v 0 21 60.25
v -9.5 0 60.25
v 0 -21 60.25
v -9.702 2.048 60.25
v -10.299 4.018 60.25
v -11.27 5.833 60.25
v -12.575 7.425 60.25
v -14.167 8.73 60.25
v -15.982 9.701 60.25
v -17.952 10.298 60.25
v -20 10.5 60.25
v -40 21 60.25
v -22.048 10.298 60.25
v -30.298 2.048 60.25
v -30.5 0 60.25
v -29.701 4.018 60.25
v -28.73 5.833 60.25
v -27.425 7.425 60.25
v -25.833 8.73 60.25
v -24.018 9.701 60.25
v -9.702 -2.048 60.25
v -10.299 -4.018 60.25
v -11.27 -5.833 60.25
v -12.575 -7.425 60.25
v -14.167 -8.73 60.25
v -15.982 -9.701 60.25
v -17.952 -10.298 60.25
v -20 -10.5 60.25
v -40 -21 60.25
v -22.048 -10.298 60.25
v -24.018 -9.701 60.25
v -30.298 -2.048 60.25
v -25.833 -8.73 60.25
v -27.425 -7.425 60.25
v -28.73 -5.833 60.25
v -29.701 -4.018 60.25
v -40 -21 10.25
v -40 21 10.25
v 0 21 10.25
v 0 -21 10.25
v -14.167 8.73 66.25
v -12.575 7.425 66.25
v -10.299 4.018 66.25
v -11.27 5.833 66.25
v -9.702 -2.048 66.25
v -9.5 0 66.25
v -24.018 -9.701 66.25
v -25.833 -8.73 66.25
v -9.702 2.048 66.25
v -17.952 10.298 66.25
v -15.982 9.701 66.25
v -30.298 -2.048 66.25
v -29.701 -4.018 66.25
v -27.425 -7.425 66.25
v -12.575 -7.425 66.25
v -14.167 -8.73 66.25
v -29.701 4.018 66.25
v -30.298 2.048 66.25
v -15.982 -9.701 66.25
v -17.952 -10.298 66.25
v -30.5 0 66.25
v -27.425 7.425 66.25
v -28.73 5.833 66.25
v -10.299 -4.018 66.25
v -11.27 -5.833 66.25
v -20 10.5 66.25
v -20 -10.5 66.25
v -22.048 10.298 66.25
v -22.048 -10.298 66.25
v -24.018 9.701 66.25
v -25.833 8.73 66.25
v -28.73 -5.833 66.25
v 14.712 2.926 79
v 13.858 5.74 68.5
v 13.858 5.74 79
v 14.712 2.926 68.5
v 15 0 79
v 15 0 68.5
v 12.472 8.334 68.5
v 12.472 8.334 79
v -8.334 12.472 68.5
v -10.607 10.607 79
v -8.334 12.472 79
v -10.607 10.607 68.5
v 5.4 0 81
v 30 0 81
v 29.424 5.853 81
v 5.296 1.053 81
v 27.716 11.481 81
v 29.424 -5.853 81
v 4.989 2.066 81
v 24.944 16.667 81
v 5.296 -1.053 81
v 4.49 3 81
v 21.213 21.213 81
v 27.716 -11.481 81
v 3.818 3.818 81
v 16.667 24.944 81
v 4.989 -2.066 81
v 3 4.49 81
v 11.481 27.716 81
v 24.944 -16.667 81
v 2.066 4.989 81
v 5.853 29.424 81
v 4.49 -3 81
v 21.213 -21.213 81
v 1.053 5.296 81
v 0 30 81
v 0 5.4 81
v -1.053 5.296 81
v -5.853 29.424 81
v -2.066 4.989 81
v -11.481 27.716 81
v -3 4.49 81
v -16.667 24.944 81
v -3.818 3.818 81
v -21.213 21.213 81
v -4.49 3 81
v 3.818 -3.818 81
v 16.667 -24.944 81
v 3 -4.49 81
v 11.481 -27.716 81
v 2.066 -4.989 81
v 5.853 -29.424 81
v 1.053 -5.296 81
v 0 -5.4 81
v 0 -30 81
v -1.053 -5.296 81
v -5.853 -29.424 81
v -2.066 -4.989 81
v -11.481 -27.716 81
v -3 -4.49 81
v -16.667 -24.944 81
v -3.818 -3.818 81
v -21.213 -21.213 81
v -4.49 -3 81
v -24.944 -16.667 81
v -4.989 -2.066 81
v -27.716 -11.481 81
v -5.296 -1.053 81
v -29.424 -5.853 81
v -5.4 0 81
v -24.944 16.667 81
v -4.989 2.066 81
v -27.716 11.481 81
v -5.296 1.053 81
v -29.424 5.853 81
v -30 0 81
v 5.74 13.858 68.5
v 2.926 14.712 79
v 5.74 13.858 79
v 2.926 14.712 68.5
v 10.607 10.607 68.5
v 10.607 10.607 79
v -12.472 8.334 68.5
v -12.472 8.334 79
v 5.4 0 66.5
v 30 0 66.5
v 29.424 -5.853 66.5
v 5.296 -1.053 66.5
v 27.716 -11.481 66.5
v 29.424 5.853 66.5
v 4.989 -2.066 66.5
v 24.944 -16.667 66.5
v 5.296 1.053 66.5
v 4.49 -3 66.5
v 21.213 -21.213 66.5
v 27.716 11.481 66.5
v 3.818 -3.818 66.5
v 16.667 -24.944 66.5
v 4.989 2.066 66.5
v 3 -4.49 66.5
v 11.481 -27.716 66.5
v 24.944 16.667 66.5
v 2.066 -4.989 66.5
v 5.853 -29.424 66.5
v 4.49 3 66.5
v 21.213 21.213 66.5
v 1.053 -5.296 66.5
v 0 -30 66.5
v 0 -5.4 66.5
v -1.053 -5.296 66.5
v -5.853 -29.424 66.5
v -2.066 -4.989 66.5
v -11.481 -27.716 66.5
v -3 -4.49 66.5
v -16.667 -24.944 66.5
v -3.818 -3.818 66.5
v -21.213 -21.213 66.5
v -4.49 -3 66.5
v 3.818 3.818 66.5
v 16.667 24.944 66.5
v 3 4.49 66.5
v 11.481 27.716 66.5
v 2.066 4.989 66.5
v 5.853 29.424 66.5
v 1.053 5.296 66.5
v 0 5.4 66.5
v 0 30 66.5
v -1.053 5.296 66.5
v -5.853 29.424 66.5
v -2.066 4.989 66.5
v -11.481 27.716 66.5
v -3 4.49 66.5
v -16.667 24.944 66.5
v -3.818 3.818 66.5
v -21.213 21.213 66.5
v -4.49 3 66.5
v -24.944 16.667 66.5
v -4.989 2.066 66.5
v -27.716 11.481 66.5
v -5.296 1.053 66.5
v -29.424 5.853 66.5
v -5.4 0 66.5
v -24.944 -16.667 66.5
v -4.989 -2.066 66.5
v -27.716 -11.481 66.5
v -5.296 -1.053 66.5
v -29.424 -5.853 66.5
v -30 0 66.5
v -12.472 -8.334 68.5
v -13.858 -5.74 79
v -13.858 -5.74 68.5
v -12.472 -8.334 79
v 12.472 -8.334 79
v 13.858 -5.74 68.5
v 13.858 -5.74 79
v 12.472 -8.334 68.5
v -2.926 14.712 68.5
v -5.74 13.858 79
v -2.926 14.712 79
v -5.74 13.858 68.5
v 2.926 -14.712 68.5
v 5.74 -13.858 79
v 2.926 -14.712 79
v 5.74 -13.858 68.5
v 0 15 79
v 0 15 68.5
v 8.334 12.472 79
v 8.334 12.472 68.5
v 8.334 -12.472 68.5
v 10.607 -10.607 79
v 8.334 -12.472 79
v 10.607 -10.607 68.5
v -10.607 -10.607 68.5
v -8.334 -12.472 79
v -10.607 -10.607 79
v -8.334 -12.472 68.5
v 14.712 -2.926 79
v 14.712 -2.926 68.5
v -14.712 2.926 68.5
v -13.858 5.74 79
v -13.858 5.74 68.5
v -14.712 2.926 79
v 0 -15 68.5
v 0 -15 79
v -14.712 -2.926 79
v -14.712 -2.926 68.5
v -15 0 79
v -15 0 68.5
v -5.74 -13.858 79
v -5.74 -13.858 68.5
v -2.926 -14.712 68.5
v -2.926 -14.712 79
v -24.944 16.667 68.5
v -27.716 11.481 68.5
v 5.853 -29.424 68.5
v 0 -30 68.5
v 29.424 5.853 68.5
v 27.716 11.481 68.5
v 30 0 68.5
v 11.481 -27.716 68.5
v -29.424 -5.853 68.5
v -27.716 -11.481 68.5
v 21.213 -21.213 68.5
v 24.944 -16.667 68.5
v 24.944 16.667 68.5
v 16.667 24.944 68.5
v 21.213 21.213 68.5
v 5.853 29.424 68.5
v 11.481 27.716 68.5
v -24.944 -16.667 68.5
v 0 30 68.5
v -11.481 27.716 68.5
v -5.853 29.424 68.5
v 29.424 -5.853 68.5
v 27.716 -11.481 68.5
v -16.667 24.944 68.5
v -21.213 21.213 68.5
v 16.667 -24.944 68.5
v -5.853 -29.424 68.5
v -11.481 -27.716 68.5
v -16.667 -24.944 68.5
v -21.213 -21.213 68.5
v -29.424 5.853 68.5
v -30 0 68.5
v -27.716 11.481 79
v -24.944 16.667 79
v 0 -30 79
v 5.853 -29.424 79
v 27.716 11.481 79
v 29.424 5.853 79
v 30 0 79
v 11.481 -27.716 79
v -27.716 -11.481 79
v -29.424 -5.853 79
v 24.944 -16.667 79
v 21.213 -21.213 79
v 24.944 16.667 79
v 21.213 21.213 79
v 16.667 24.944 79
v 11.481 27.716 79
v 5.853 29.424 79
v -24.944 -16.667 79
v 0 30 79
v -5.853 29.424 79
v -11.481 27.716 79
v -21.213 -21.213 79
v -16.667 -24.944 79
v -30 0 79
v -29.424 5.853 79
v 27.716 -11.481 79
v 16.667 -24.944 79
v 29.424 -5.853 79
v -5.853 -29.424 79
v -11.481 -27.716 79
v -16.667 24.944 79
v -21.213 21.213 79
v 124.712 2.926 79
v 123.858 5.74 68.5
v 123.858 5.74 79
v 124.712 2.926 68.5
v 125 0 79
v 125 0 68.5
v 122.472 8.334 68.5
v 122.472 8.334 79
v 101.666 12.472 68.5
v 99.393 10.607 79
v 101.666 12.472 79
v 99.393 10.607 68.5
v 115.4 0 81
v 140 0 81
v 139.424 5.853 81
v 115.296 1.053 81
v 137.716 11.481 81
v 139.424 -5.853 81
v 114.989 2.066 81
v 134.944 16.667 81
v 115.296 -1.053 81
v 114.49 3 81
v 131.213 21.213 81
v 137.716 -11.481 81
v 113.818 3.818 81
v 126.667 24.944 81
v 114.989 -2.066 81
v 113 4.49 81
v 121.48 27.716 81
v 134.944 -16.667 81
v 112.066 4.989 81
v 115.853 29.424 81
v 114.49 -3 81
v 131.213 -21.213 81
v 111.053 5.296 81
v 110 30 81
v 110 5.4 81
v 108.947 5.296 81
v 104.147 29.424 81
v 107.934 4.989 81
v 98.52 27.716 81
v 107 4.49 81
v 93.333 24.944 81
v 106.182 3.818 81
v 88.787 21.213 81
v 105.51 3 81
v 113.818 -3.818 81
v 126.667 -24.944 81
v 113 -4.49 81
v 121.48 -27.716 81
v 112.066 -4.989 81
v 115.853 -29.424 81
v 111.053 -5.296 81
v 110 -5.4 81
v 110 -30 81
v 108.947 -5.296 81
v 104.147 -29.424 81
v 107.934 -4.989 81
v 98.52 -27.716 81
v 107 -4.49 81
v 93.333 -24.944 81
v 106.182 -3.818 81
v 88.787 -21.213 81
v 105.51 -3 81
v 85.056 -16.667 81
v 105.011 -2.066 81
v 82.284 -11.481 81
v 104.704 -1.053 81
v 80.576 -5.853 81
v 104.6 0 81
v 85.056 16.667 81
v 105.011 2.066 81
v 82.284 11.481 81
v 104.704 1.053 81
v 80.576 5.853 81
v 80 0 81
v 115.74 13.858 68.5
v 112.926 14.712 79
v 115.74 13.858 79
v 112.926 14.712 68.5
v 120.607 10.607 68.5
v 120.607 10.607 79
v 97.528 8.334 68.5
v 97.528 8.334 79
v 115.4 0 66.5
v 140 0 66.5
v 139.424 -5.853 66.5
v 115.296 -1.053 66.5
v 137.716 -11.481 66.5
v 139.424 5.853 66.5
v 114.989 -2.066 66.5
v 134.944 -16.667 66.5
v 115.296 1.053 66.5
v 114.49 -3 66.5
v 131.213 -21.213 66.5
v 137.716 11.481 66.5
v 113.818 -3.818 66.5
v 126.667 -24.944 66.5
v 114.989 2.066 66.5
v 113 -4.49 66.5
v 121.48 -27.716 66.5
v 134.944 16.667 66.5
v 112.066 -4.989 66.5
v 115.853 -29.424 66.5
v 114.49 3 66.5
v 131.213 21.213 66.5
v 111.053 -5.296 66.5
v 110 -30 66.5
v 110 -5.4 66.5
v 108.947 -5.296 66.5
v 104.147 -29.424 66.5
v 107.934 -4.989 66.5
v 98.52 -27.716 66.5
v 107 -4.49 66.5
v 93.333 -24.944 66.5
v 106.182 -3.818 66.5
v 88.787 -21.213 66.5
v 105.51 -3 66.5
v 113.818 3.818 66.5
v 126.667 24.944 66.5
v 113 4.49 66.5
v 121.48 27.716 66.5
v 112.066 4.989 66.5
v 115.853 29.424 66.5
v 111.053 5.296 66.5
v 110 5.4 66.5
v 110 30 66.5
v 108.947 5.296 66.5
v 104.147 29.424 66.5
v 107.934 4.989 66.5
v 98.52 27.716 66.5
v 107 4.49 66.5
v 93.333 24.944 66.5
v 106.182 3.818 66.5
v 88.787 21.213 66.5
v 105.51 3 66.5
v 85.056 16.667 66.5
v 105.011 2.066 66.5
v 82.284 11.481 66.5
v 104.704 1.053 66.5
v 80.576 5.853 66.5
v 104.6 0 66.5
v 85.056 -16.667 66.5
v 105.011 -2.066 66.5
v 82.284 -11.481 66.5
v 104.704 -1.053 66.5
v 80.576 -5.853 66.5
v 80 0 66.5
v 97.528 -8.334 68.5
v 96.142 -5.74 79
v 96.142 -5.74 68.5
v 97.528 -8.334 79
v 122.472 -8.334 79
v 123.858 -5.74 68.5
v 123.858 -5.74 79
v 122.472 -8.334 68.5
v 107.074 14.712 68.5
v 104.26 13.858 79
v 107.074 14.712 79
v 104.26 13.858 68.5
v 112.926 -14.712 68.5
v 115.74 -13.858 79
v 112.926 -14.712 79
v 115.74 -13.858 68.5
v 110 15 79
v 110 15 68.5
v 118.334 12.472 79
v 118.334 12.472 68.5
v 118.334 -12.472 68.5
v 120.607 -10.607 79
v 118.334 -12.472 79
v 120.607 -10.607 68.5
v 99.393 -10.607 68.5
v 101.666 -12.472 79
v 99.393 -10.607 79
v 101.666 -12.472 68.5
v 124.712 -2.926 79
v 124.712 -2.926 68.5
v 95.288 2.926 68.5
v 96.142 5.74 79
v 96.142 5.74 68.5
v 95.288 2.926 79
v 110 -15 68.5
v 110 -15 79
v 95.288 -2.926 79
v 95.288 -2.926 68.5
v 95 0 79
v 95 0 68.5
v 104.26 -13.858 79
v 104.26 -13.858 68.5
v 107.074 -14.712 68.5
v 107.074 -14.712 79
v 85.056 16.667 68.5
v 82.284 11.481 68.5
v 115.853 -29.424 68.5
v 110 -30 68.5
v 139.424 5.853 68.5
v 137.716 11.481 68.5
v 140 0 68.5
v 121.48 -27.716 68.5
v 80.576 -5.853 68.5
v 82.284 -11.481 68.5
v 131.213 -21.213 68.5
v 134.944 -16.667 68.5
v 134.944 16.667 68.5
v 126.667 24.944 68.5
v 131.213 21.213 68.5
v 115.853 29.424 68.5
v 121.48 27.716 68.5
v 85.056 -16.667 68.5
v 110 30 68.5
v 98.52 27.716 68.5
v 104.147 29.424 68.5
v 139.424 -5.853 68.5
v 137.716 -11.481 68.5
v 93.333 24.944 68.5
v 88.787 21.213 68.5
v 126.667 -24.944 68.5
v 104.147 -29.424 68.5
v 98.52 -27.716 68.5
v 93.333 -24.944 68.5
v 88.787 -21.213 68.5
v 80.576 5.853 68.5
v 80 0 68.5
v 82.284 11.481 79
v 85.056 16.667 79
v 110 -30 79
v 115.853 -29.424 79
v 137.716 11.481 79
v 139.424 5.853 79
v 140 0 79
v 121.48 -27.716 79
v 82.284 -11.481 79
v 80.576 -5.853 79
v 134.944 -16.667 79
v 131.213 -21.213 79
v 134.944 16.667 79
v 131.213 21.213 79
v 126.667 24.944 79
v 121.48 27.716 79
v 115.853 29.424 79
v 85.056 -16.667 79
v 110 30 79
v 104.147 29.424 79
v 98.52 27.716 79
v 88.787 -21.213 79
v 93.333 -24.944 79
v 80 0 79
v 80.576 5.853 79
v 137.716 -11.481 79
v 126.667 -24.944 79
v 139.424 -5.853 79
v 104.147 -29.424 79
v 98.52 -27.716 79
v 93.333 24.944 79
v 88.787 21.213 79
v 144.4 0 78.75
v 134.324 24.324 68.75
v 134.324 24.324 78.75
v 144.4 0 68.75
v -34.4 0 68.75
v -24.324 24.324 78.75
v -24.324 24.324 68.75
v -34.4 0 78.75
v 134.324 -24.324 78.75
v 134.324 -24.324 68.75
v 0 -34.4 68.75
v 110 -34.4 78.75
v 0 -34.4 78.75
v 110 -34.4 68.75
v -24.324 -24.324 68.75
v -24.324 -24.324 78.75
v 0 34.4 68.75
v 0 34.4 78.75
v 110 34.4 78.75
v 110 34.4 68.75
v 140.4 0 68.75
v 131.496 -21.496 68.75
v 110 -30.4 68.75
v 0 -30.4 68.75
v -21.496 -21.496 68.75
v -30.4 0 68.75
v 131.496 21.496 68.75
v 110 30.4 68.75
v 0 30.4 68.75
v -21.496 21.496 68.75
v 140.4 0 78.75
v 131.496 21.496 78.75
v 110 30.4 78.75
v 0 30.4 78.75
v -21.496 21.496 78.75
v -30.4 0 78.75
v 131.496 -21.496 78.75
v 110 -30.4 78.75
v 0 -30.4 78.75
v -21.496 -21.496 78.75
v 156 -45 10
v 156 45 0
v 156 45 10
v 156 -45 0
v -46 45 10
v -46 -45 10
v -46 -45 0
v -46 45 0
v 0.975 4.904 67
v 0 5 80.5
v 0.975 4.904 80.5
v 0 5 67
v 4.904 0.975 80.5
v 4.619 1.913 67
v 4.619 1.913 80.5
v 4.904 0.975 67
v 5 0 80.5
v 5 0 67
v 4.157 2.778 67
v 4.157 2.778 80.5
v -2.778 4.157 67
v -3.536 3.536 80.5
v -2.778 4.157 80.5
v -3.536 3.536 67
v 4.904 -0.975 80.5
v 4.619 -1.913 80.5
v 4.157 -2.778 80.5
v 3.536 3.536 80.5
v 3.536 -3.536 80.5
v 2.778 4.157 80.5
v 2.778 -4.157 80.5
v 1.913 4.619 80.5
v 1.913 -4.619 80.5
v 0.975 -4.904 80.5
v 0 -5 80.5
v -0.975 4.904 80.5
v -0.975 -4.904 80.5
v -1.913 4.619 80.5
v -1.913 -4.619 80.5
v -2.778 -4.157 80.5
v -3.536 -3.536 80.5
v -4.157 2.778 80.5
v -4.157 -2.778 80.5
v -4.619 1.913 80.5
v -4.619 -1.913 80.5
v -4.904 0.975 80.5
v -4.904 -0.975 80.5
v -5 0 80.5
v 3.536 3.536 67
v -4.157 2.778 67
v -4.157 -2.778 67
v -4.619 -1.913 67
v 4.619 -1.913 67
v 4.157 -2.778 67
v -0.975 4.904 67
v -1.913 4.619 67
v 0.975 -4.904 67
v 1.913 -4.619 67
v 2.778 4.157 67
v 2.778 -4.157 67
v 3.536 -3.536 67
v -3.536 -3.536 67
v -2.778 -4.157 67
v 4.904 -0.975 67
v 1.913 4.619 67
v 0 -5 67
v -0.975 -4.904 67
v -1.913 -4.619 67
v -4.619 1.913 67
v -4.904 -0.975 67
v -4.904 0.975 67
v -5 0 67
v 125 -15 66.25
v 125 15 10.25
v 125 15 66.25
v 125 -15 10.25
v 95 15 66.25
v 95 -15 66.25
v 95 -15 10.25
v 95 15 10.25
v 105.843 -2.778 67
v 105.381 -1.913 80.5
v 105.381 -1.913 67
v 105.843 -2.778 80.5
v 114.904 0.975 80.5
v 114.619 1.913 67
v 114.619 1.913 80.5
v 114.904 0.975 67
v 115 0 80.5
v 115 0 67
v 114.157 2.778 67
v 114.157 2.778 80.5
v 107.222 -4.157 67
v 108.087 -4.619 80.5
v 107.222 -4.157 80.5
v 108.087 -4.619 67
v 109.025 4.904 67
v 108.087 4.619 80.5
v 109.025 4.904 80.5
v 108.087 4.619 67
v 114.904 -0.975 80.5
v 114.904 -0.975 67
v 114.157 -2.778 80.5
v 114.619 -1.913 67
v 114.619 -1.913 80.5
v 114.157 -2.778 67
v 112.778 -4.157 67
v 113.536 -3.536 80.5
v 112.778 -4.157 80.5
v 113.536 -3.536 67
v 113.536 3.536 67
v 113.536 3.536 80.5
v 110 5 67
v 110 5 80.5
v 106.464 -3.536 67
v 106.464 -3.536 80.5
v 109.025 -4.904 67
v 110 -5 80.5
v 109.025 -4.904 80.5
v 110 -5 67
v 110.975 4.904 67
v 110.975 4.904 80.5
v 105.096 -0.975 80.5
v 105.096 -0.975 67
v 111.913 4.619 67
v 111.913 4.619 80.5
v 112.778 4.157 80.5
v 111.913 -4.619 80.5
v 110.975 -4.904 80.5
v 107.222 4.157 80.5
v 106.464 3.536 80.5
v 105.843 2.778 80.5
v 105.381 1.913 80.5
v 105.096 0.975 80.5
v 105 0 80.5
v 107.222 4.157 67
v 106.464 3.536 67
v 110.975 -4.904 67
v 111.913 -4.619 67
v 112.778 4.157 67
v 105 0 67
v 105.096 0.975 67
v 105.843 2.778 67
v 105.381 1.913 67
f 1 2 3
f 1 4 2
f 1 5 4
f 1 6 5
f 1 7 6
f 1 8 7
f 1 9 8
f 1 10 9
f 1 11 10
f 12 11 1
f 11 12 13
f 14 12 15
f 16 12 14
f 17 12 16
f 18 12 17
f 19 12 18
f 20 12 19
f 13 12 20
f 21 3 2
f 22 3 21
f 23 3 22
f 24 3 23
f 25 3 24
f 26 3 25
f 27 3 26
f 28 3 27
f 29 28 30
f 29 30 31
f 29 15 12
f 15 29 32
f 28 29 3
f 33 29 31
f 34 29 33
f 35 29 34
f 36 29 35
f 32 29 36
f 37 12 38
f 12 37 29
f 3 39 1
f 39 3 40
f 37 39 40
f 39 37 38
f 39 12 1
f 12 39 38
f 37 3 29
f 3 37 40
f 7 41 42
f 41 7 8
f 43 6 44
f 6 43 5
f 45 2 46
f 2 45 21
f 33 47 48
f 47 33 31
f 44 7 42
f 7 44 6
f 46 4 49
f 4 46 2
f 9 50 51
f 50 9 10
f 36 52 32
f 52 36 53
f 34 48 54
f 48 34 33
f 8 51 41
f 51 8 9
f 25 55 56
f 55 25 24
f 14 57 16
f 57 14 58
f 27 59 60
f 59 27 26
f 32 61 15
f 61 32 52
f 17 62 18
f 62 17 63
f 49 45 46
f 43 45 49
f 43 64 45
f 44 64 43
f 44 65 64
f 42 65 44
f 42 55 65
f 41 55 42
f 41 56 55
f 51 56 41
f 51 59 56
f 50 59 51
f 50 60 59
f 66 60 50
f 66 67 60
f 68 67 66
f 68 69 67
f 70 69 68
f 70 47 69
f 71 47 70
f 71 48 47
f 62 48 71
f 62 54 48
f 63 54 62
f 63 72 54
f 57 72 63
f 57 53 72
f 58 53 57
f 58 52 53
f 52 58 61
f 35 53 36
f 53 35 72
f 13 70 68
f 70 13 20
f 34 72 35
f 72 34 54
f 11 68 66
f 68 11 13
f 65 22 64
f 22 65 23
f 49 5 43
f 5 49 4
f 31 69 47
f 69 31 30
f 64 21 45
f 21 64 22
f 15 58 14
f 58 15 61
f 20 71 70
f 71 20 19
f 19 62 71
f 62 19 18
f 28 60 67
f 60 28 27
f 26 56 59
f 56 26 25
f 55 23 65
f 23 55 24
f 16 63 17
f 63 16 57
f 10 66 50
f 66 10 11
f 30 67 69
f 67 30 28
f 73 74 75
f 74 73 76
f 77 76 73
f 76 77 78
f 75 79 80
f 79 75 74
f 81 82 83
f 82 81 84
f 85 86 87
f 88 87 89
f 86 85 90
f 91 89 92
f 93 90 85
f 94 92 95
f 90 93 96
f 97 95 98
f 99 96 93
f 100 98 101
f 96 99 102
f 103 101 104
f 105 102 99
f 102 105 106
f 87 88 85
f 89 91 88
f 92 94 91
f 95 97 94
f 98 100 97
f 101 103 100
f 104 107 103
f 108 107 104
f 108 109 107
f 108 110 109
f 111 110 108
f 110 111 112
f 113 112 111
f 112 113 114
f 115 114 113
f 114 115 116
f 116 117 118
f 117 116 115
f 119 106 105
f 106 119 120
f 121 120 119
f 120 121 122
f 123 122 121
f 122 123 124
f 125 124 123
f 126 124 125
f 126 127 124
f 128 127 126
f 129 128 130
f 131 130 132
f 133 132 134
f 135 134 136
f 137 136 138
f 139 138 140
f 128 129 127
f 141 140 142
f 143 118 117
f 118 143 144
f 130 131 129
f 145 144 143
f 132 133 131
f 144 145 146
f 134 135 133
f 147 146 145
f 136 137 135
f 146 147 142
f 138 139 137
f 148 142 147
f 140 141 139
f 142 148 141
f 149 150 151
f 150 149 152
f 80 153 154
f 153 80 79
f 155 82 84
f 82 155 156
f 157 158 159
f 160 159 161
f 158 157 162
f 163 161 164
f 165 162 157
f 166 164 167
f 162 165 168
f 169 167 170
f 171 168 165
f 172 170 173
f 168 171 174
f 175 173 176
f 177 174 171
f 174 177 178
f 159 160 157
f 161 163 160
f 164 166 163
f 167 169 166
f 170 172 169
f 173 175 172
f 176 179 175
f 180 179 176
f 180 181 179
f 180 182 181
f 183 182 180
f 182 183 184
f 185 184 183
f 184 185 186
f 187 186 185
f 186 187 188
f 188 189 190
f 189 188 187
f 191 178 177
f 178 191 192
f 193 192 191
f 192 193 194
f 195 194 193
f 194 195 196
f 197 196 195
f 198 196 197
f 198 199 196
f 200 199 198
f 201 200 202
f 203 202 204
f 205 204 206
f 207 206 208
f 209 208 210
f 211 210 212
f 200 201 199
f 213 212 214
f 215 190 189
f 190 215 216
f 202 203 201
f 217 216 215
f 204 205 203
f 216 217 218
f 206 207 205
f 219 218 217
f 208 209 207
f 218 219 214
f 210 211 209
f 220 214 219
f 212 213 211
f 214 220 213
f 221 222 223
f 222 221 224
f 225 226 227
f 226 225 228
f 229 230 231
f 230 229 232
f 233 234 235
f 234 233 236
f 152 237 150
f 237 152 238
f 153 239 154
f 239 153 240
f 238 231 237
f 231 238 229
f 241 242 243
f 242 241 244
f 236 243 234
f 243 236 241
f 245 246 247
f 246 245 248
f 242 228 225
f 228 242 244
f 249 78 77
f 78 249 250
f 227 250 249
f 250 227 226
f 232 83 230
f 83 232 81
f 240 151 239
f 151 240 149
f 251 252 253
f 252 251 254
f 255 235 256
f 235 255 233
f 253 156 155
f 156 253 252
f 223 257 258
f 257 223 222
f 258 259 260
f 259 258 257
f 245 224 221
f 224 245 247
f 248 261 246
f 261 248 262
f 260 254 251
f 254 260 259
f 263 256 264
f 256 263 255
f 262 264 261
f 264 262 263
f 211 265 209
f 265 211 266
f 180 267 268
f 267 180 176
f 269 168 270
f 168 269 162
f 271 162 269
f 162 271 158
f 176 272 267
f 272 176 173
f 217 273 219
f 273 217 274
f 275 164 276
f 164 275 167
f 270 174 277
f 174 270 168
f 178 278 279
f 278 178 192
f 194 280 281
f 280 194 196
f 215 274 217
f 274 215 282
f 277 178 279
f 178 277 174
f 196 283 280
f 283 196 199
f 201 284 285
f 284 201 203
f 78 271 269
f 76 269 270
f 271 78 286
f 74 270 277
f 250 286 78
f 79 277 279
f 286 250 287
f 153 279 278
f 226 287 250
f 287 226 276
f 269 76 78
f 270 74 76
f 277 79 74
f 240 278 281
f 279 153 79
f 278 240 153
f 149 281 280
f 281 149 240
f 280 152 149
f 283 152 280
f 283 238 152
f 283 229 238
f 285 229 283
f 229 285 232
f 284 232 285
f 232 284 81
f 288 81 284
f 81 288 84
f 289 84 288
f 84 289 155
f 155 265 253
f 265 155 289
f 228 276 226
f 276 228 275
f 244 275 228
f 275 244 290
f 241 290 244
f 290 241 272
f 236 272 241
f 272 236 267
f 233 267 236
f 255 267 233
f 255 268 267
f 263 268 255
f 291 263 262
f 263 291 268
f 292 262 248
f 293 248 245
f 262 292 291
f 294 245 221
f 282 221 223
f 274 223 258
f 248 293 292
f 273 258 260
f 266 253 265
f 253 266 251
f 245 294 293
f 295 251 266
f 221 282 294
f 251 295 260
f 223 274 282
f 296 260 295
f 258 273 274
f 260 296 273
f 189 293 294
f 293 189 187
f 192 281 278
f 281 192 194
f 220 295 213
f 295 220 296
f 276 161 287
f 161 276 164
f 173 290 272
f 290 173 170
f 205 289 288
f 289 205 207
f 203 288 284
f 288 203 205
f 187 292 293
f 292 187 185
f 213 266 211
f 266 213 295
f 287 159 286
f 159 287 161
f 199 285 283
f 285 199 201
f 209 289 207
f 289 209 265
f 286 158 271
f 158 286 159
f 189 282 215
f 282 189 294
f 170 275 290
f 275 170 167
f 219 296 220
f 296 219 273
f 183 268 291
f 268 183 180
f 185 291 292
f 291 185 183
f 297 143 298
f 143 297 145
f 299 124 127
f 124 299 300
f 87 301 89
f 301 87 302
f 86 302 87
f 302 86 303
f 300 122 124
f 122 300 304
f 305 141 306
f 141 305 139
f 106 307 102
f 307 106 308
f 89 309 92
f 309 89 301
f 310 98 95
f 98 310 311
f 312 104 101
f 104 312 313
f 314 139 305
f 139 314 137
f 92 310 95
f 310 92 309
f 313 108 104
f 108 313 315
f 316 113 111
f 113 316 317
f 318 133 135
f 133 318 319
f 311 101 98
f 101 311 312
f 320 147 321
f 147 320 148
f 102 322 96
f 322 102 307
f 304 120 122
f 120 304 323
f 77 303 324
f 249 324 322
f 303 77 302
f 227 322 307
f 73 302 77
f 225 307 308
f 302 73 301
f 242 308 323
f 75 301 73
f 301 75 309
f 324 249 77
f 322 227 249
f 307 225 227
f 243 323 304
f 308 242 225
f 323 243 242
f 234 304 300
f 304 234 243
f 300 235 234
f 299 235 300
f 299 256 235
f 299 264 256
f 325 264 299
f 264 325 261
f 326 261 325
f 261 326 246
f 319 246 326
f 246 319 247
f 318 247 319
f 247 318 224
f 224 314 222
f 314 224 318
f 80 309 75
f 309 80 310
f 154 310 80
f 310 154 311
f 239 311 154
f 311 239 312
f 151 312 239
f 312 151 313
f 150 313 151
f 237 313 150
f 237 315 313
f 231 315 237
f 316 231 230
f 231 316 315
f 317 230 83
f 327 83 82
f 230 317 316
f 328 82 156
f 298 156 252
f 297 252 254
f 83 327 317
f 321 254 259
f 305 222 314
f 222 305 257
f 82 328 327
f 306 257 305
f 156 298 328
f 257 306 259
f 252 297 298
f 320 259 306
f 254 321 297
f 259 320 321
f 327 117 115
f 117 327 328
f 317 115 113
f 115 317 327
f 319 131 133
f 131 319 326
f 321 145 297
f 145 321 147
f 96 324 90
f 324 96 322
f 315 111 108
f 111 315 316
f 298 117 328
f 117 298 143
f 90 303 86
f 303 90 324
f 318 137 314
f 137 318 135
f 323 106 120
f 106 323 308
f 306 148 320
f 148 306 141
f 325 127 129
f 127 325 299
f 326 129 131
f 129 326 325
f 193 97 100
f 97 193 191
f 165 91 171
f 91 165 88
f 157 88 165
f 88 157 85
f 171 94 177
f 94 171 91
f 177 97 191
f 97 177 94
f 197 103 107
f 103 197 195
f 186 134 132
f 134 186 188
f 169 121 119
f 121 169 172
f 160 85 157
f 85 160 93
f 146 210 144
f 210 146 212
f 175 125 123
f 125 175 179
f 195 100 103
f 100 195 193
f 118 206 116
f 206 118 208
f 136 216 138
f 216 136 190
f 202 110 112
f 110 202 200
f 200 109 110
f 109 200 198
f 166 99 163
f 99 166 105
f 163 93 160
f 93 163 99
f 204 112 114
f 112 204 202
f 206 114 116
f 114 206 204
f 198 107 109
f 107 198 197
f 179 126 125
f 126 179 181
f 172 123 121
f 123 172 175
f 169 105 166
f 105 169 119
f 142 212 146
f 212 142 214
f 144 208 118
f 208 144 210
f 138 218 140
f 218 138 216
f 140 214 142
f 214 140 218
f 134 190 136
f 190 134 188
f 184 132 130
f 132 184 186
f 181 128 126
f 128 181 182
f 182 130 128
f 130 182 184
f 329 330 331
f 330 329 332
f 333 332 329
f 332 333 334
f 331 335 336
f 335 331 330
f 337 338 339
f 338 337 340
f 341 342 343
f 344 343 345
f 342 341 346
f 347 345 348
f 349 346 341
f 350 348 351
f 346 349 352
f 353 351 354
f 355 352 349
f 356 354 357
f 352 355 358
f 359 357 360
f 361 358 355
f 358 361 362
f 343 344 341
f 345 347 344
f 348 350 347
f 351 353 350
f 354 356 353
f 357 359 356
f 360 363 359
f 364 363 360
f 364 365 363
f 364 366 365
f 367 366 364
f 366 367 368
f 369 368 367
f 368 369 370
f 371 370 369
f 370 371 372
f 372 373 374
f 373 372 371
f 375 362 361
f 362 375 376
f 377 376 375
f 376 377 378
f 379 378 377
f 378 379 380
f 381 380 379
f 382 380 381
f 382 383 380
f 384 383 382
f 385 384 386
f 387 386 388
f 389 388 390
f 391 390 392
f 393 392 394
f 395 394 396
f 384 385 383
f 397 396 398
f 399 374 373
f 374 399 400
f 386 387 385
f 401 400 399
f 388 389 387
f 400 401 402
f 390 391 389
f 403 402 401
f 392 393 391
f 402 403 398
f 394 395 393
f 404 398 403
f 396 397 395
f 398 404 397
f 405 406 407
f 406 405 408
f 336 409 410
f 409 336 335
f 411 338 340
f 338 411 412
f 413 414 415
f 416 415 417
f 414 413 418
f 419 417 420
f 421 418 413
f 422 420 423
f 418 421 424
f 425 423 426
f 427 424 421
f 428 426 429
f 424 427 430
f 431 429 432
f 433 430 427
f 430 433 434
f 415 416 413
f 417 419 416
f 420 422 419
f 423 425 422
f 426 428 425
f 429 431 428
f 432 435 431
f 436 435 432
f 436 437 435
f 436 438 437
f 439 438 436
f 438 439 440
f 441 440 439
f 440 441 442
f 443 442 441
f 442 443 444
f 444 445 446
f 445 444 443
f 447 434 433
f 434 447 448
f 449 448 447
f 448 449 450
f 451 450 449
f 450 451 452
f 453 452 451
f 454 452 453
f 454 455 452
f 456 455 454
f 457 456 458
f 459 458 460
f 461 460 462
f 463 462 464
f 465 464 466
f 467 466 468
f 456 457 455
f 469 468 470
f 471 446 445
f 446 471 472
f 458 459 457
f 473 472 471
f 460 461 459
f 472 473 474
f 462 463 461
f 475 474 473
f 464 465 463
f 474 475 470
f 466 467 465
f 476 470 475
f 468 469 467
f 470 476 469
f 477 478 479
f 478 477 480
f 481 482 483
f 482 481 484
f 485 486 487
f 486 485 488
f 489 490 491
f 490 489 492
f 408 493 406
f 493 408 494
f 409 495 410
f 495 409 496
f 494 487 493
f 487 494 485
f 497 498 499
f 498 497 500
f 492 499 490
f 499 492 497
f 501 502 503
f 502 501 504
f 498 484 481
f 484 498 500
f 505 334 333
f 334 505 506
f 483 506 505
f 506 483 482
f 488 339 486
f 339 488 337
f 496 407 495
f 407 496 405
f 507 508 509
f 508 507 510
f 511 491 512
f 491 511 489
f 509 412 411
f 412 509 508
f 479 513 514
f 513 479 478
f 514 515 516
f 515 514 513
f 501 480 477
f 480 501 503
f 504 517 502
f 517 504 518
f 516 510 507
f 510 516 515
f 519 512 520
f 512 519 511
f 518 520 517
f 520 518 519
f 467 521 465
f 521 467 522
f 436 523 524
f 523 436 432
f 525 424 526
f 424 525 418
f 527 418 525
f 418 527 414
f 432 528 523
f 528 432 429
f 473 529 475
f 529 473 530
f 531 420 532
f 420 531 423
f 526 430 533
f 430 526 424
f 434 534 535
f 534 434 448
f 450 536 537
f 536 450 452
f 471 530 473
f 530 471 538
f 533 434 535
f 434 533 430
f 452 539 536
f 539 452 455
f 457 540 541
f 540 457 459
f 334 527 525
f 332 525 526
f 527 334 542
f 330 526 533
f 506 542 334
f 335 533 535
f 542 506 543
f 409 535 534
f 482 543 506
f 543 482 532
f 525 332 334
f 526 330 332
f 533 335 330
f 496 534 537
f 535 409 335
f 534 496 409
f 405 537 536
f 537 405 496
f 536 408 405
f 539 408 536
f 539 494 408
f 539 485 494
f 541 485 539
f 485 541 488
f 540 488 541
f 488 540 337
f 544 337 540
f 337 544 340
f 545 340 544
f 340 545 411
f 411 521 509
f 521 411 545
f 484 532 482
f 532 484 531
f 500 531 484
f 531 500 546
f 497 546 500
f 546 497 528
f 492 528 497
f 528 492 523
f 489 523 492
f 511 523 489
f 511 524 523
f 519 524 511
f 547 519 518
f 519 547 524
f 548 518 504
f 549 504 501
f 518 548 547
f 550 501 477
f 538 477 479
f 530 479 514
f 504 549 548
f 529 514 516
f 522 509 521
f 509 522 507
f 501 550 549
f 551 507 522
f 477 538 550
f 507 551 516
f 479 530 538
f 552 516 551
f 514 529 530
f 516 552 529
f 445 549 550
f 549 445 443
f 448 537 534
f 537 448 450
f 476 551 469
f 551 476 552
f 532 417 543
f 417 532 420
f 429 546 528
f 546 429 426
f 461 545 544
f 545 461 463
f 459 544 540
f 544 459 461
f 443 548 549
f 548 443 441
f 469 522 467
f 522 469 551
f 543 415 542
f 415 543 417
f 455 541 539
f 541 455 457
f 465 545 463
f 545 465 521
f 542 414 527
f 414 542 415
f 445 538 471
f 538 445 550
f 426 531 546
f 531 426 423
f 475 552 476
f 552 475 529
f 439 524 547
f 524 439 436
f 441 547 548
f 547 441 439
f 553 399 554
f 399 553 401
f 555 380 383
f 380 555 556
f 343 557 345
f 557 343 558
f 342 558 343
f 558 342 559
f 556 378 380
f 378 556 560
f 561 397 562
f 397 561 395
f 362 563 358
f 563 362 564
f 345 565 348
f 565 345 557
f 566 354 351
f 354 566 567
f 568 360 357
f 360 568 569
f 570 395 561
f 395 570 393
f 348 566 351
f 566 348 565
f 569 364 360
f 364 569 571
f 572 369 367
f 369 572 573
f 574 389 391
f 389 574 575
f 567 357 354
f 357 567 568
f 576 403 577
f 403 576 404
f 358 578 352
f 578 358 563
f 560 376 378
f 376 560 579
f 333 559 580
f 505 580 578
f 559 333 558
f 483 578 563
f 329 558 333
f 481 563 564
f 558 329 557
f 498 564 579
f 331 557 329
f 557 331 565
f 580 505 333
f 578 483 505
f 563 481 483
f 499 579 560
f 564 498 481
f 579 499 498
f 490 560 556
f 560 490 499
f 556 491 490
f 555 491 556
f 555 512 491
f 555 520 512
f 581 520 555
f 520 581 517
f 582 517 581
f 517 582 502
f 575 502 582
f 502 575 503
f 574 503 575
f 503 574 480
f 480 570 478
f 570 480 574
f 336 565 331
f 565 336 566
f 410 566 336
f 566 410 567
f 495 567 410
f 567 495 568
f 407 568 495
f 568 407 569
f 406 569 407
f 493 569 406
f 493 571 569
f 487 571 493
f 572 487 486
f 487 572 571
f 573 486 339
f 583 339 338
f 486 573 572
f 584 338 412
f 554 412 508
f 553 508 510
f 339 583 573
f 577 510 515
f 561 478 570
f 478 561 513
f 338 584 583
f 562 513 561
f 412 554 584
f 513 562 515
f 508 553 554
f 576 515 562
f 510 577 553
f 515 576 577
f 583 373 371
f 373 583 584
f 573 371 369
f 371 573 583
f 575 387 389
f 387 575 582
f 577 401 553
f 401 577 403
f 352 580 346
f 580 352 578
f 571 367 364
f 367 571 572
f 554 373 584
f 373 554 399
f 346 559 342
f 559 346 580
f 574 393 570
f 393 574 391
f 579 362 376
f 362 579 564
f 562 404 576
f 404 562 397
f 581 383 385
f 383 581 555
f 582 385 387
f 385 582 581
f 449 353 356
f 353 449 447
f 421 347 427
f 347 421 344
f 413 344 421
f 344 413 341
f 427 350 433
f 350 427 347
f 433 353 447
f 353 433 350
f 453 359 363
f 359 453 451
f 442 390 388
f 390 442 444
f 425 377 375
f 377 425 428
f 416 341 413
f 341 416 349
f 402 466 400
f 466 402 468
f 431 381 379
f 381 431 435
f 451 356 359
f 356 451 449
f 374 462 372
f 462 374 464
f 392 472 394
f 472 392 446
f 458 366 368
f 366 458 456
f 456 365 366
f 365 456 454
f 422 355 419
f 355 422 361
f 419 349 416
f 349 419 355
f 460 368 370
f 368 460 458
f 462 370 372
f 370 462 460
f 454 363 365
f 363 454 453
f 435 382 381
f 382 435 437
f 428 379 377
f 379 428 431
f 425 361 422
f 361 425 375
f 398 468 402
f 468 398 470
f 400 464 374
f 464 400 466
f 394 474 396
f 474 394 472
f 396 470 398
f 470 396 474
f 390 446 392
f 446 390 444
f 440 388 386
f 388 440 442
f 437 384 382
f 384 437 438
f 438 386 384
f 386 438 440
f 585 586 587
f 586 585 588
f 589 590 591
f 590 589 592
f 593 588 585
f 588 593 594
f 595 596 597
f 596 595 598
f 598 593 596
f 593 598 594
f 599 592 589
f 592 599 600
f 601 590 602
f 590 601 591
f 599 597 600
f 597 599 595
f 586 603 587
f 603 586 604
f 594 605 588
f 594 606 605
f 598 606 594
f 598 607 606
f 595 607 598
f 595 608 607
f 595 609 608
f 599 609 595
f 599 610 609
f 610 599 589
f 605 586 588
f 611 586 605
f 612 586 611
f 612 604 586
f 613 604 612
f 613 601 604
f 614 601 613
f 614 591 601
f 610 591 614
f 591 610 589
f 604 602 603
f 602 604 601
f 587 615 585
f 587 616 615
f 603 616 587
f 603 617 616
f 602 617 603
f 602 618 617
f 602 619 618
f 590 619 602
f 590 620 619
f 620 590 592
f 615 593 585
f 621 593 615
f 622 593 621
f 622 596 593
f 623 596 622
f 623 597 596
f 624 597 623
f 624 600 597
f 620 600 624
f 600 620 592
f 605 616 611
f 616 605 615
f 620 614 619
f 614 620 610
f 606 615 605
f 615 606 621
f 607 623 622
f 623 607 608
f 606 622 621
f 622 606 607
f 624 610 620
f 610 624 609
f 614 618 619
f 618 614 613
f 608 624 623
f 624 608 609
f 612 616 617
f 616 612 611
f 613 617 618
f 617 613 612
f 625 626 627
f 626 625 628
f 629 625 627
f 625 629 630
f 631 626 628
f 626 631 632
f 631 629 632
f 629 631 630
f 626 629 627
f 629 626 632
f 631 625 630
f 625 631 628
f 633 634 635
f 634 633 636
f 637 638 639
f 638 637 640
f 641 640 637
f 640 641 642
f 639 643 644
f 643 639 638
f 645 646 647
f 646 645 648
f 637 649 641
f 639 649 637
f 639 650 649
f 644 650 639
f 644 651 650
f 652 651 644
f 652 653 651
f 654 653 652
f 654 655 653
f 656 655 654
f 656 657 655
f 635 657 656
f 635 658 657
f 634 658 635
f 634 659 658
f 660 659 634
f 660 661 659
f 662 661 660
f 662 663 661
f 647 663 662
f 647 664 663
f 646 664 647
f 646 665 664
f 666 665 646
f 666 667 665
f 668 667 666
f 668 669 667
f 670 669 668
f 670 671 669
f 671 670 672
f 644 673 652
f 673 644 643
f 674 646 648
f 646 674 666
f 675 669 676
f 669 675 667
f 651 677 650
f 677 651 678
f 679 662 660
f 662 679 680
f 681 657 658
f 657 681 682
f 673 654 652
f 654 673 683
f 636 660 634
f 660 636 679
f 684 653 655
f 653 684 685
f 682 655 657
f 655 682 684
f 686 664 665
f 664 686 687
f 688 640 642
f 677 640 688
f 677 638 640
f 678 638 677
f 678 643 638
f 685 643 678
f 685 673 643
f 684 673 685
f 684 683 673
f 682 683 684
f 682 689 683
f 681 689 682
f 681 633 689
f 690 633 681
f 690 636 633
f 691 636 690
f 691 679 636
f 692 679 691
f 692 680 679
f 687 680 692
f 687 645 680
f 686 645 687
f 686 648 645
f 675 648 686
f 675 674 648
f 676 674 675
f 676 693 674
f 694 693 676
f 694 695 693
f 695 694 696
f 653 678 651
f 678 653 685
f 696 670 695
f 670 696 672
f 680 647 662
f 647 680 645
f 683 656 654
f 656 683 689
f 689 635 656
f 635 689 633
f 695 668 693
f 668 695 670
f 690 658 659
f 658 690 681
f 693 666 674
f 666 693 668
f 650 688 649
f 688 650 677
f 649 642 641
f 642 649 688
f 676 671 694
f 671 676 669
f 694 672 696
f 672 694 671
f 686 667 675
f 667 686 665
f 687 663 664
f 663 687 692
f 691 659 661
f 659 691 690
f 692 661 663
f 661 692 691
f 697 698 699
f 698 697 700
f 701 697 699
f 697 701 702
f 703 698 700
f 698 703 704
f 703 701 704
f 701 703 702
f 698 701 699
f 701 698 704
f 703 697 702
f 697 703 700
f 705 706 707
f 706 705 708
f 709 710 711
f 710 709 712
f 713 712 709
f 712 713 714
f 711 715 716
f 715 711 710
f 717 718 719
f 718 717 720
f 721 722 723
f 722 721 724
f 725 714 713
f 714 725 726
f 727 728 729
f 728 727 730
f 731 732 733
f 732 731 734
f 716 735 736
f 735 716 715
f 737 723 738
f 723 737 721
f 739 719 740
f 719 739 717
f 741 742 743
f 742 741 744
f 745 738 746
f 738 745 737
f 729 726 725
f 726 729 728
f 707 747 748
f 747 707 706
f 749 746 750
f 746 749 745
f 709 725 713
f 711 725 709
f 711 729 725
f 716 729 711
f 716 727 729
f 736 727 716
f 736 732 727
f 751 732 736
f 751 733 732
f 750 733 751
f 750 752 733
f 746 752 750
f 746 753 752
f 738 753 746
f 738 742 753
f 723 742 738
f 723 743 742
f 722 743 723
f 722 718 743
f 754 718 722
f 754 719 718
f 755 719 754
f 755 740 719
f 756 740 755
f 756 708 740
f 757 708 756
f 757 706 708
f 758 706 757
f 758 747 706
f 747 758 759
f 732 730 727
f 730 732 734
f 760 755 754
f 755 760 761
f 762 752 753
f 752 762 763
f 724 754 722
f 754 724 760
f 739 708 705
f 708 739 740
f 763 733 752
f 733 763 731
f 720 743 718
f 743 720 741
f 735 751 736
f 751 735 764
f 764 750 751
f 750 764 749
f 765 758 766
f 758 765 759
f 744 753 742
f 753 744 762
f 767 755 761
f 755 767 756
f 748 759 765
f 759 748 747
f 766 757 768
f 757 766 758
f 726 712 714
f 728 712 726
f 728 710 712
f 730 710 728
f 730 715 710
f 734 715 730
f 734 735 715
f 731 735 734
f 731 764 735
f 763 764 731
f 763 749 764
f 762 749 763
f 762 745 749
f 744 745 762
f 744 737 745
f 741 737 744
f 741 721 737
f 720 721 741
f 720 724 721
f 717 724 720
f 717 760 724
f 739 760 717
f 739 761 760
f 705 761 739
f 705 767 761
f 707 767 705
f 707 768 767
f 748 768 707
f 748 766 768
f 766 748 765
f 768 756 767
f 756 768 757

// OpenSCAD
$fn = 32;

// ------------------------------------------------------------------------
// Motor belt drive: span 110 mm, pulleys d60, belt 10 mm wide
// Every part is its own module, assembly() places every instance.
// ------------------------------------------------------------------------

// --- part 1 ---
module base_plate() {
  difference() {
    translate([-101, -45, 0]) cube([202, 90, 10]);
  }
}

// --- part 2 ---
module motor() {
  union() {
    translate([-25, -21, 0]) cube([50, 42, 40]);
    translate([28, 0, 20]) rotate([0, 90, 0]) cylinder(h = 6, d = 21, center = true);
  }
}

// --- part 3 ---
module drive_shaft() {
  translate([0, 0, -6.75]) cylinder(h = 13.5, d = 10);
}

// --- part 4 ---
module pulley_drive() {
  difference() {
    union() {
      cylinder(h = 14.5, d = 30);
      cylinder(h = 2, d = 60);
      translate([0, 0, 12.5]) cylinder(h = 2, d = 60);
    }
    translate([0, 0, -1]) cylinder(h = 16.5, d = 10.8);
  }
}

// --- part 5 ---
module idler_post() {
  translate([-15, -15, 0]) cube([30, 30, 56]);
}

// --- part 6 ---
module driven_shaft() {
  translate([0, 0, -6.75]) cylinder(h = 13.5, d = 10);
}

// --- part 7 ---
module pulley_driven() {
  difference() {
    union() {
      cylinder(h = 14.5, d = 30);
      cylinder(h = 2, d = 60);
      translate([0, 0, 12.5]) cylinder(h = 2, d = 60);
    }
    translate([0, 0, -1]) cylinder(h = 16.5, d = 10.8);
  }
}

// --- part 8 ---
module drive_belt() {
  difference() {
    linear_extrude(height = 10) polygon(points = concat([for (a = [90 : 45 : 270]) [34.4 * cos(a), 34.4 * sin(a)]], [for (a = [270 : 45 : 450]) [110 + 34.4 * cos(a), 34.4 * sin(a)]]));
    translate([0, 0, -1]) linear_extrude(height = 12) polygon(points = concat([for (a = [90 : 45 : 270]) [30.4 * cos(a), 30.4 * sin(a)]], [for (a = [270 : 45 : 450]) [110 + 30.4 * cos(a), 30.4 * sin(a)]]));
  }
}

// --- assembly ---
module assembly() {
  color([0.80, 0.24, 0.20]) translate([55, 0, 0]) rotate([0, 0, 0]) base_plate();
  color([0.20, 0.45, 0.75]) translate([0, 0, 35.25]) rotate([0, 270, 0]) motor();
  color([0.25, 0.62, 0.32]) translate([0, 0, 73.75]) rotate([0, 0, 0]) drive_shaft();
  color([0.92, 0.70, 0.18]) translate([0, 0, 66.5]) rotate([0, 0, 0]) pulley_drive();
  color([0.58, 0.35, 0.70]) translate([110, 0, 10.25]) rotate([0, 0, 0]) idler_post();
  color([0.16, 0.66, 0.66]) translate([110, 0, 73.75]) rotate([0, 0, 0]) driven_shaft();
  color([0.85, 0.48, 0.18]) translate([110, 0, 66.5]) rotate([0, 0, 0]) pulley_driven();
  color([0.55, 0.60, 0.65]) translate([0, 0, 68.75]) rotate([0, 0, 0]) drive_belt();
}

assembly();
